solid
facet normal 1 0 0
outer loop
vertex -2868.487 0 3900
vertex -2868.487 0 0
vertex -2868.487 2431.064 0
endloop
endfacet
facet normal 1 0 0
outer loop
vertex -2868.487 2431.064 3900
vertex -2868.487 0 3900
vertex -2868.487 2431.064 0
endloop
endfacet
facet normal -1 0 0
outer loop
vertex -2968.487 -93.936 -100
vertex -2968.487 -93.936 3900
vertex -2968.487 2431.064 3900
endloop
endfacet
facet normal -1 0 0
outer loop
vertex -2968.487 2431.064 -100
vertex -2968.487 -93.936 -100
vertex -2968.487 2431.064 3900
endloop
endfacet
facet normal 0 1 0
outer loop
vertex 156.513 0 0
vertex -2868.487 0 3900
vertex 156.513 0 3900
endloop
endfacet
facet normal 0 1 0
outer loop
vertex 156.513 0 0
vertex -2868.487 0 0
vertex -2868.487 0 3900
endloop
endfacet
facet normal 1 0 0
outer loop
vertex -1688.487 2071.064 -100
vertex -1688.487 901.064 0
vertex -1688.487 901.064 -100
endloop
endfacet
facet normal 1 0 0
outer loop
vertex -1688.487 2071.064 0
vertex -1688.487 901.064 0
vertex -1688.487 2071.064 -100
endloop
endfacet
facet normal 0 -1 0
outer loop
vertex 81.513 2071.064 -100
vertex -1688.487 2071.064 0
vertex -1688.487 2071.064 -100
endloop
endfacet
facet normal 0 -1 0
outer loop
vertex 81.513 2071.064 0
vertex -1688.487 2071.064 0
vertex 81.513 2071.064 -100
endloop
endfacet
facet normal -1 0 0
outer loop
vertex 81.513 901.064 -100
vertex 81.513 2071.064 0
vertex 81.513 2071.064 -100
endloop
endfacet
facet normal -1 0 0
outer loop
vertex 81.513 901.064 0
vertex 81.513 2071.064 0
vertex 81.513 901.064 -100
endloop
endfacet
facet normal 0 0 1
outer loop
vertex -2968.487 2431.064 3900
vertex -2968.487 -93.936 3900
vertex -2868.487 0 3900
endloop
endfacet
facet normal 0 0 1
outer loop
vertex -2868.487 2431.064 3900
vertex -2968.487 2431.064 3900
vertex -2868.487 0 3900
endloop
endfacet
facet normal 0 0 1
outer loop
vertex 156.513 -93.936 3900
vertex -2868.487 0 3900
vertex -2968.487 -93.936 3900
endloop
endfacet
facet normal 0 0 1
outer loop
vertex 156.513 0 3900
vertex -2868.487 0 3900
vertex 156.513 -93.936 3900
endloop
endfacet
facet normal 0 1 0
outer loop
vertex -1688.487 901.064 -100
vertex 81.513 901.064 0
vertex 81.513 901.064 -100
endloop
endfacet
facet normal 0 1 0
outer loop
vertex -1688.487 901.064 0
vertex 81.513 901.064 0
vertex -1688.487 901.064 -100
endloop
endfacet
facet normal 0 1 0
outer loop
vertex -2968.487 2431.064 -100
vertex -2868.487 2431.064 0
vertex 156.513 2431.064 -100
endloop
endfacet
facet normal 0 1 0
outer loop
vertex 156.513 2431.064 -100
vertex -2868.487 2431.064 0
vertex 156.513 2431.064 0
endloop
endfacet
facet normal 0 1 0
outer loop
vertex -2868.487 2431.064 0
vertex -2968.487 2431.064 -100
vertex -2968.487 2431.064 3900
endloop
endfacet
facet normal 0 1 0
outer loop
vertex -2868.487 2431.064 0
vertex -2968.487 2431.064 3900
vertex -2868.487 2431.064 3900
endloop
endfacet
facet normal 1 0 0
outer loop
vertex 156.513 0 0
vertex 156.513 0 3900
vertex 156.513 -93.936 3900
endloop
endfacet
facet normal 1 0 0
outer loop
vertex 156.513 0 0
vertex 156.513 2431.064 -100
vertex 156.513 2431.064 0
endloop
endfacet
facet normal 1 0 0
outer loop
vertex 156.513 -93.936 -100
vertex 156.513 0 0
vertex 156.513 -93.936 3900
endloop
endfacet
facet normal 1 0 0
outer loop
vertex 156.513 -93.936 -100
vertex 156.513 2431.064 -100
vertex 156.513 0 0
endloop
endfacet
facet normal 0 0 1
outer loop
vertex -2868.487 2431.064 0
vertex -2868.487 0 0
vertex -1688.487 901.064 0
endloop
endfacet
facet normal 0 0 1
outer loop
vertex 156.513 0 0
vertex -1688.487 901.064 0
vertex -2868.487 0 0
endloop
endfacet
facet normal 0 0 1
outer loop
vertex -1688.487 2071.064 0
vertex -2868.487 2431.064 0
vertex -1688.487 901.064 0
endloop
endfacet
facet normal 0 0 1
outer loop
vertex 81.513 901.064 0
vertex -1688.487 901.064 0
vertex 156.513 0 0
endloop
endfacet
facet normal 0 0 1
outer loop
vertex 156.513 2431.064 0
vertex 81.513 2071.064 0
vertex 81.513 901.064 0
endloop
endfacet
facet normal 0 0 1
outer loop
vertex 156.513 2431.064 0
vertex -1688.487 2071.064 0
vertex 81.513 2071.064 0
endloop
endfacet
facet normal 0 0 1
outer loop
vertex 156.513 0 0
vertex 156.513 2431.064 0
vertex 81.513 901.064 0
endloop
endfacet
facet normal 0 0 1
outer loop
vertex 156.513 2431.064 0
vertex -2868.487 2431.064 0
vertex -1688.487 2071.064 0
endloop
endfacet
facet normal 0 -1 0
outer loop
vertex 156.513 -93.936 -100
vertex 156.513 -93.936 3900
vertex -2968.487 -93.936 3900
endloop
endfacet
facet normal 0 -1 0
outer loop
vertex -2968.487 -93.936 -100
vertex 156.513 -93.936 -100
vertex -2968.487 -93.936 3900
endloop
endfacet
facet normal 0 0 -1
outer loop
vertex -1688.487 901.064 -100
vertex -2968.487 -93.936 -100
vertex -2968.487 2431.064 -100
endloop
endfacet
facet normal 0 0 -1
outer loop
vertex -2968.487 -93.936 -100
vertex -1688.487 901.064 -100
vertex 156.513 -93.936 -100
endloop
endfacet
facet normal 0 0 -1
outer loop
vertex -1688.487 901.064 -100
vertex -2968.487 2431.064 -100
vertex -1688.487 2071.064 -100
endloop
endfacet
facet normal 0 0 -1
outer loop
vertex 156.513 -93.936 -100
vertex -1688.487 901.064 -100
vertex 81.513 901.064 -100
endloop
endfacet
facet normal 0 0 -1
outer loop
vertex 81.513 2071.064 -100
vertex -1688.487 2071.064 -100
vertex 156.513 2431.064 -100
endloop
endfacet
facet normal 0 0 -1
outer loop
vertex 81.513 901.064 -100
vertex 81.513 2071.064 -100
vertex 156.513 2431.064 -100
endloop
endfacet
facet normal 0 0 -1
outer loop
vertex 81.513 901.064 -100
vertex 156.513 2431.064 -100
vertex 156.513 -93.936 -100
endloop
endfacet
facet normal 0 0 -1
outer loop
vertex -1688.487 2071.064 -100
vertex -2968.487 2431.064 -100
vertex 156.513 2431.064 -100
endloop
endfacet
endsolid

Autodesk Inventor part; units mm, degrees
ref_plane "YZ Plane" through (0, 0, 0) normal (1, 0, 0) x (0, 1, 0)
ref_plane "XZ Plane" through (0, 0, 0) normal (0, 1, 0) x (-1, 0, 0)
ref_plane "XY Plane" through (0, 0, 0) normal (0, 0, 1) x (1, 0, 0)
sketch "草图1" plane through (0, 0, 0) normal (0, 0, 1) x (1, 0, 0)
  line L0 (-2968.4868, 2431.0636) -> (156.5132, 2431.0636)
  line L1 (156.5132, 2431.0636) -> (156.5132, -93.9364)
  line L2 (156.5132, -93.9364) -> (-2968.4868, -93.9364)
  line L3 (-2968.4868, -93.9364) -> (-2968.4868, 2431.0636)
  line L4 (-1688.4868, 2071.0636) -> (81.5132, 2071.0636)
  line L5 (81.5132, 2071.0636) -> (81.5132, 901.0636)
  line L6 (81.5132, 901.0636) -> (-1688.4868, 901.0636)
  line L7 (-1688.4868, 901.0636) -> (-1688.4868, 2071.0636)
  line L8 (-2968.4868, 2188.5636) -> (-2968.4868, 2431.0636)
  line L9 (-2968.4868, -93.9364) -> (156.5132, -93.9364)
  line L10 (156.5132, -93.9364) -> (156.5132, -83.9364)
  line L11 (-2968.4868, -83.9364) -> (-2968.4868, -93.9364)
  point P0 (0, 0)
  dimension "d0" = 3125
  dimension "d1" = 2525
  dimension "d2" = 360
  dimension "d3" = 75
  dimension "d4" = 1770
  dimension "d5" = 1170
extrude "拉伸1" add sketch "草图1" against normal blind 100
sketch "草图3" plane through (0, 0, 0) normal (0, 0, 1) x (1, 0, 0)
  line L0 (-2968.4868, 2431.0636) -> (156.5132, 2431.0636) projected
  line L1 (-2868.4868, 2431.0636) -> (-2968.4868, 2431.0636)
  line L2 (-2968.4868, 2431.0636) -> (-2968.4868, -93.9364)
  line L3 (-2968.4868, -93.9364) -> (-2868.4868, -93.9364)
  line L4 (-2868.4868, -93.9364) -> (-2868.4868, 2431.0636)
  point P0 (0, 0)
  dimension "d16" = 100
extrude "拉伸2" add sketch "草图3" along normal blind 3900
sketch "草图4" plane through (0, 0, 0) normal (0, 0, 1) x (1, 0, 0)
  line L0 (-2868.4868, 2431.0636) -> (-2868.4868, -93.9364) projected
  line L1 (156.5132, -93.9364) -> (-2868.4868, -93.9364)
  line L2 (-2868.4868, -93.9364) -> (-2868.4868, 0)
  line L3 (-2868.4868, 0) -> (156.5132, 0)
  line L4 (156.5132, 0) -> (156.5132, -93.9364)
  point P0 (0, 0)
extrude "拉伸3" add sketch "草图4" along normal blind 3900
properties part number "RoomEnvironment"
